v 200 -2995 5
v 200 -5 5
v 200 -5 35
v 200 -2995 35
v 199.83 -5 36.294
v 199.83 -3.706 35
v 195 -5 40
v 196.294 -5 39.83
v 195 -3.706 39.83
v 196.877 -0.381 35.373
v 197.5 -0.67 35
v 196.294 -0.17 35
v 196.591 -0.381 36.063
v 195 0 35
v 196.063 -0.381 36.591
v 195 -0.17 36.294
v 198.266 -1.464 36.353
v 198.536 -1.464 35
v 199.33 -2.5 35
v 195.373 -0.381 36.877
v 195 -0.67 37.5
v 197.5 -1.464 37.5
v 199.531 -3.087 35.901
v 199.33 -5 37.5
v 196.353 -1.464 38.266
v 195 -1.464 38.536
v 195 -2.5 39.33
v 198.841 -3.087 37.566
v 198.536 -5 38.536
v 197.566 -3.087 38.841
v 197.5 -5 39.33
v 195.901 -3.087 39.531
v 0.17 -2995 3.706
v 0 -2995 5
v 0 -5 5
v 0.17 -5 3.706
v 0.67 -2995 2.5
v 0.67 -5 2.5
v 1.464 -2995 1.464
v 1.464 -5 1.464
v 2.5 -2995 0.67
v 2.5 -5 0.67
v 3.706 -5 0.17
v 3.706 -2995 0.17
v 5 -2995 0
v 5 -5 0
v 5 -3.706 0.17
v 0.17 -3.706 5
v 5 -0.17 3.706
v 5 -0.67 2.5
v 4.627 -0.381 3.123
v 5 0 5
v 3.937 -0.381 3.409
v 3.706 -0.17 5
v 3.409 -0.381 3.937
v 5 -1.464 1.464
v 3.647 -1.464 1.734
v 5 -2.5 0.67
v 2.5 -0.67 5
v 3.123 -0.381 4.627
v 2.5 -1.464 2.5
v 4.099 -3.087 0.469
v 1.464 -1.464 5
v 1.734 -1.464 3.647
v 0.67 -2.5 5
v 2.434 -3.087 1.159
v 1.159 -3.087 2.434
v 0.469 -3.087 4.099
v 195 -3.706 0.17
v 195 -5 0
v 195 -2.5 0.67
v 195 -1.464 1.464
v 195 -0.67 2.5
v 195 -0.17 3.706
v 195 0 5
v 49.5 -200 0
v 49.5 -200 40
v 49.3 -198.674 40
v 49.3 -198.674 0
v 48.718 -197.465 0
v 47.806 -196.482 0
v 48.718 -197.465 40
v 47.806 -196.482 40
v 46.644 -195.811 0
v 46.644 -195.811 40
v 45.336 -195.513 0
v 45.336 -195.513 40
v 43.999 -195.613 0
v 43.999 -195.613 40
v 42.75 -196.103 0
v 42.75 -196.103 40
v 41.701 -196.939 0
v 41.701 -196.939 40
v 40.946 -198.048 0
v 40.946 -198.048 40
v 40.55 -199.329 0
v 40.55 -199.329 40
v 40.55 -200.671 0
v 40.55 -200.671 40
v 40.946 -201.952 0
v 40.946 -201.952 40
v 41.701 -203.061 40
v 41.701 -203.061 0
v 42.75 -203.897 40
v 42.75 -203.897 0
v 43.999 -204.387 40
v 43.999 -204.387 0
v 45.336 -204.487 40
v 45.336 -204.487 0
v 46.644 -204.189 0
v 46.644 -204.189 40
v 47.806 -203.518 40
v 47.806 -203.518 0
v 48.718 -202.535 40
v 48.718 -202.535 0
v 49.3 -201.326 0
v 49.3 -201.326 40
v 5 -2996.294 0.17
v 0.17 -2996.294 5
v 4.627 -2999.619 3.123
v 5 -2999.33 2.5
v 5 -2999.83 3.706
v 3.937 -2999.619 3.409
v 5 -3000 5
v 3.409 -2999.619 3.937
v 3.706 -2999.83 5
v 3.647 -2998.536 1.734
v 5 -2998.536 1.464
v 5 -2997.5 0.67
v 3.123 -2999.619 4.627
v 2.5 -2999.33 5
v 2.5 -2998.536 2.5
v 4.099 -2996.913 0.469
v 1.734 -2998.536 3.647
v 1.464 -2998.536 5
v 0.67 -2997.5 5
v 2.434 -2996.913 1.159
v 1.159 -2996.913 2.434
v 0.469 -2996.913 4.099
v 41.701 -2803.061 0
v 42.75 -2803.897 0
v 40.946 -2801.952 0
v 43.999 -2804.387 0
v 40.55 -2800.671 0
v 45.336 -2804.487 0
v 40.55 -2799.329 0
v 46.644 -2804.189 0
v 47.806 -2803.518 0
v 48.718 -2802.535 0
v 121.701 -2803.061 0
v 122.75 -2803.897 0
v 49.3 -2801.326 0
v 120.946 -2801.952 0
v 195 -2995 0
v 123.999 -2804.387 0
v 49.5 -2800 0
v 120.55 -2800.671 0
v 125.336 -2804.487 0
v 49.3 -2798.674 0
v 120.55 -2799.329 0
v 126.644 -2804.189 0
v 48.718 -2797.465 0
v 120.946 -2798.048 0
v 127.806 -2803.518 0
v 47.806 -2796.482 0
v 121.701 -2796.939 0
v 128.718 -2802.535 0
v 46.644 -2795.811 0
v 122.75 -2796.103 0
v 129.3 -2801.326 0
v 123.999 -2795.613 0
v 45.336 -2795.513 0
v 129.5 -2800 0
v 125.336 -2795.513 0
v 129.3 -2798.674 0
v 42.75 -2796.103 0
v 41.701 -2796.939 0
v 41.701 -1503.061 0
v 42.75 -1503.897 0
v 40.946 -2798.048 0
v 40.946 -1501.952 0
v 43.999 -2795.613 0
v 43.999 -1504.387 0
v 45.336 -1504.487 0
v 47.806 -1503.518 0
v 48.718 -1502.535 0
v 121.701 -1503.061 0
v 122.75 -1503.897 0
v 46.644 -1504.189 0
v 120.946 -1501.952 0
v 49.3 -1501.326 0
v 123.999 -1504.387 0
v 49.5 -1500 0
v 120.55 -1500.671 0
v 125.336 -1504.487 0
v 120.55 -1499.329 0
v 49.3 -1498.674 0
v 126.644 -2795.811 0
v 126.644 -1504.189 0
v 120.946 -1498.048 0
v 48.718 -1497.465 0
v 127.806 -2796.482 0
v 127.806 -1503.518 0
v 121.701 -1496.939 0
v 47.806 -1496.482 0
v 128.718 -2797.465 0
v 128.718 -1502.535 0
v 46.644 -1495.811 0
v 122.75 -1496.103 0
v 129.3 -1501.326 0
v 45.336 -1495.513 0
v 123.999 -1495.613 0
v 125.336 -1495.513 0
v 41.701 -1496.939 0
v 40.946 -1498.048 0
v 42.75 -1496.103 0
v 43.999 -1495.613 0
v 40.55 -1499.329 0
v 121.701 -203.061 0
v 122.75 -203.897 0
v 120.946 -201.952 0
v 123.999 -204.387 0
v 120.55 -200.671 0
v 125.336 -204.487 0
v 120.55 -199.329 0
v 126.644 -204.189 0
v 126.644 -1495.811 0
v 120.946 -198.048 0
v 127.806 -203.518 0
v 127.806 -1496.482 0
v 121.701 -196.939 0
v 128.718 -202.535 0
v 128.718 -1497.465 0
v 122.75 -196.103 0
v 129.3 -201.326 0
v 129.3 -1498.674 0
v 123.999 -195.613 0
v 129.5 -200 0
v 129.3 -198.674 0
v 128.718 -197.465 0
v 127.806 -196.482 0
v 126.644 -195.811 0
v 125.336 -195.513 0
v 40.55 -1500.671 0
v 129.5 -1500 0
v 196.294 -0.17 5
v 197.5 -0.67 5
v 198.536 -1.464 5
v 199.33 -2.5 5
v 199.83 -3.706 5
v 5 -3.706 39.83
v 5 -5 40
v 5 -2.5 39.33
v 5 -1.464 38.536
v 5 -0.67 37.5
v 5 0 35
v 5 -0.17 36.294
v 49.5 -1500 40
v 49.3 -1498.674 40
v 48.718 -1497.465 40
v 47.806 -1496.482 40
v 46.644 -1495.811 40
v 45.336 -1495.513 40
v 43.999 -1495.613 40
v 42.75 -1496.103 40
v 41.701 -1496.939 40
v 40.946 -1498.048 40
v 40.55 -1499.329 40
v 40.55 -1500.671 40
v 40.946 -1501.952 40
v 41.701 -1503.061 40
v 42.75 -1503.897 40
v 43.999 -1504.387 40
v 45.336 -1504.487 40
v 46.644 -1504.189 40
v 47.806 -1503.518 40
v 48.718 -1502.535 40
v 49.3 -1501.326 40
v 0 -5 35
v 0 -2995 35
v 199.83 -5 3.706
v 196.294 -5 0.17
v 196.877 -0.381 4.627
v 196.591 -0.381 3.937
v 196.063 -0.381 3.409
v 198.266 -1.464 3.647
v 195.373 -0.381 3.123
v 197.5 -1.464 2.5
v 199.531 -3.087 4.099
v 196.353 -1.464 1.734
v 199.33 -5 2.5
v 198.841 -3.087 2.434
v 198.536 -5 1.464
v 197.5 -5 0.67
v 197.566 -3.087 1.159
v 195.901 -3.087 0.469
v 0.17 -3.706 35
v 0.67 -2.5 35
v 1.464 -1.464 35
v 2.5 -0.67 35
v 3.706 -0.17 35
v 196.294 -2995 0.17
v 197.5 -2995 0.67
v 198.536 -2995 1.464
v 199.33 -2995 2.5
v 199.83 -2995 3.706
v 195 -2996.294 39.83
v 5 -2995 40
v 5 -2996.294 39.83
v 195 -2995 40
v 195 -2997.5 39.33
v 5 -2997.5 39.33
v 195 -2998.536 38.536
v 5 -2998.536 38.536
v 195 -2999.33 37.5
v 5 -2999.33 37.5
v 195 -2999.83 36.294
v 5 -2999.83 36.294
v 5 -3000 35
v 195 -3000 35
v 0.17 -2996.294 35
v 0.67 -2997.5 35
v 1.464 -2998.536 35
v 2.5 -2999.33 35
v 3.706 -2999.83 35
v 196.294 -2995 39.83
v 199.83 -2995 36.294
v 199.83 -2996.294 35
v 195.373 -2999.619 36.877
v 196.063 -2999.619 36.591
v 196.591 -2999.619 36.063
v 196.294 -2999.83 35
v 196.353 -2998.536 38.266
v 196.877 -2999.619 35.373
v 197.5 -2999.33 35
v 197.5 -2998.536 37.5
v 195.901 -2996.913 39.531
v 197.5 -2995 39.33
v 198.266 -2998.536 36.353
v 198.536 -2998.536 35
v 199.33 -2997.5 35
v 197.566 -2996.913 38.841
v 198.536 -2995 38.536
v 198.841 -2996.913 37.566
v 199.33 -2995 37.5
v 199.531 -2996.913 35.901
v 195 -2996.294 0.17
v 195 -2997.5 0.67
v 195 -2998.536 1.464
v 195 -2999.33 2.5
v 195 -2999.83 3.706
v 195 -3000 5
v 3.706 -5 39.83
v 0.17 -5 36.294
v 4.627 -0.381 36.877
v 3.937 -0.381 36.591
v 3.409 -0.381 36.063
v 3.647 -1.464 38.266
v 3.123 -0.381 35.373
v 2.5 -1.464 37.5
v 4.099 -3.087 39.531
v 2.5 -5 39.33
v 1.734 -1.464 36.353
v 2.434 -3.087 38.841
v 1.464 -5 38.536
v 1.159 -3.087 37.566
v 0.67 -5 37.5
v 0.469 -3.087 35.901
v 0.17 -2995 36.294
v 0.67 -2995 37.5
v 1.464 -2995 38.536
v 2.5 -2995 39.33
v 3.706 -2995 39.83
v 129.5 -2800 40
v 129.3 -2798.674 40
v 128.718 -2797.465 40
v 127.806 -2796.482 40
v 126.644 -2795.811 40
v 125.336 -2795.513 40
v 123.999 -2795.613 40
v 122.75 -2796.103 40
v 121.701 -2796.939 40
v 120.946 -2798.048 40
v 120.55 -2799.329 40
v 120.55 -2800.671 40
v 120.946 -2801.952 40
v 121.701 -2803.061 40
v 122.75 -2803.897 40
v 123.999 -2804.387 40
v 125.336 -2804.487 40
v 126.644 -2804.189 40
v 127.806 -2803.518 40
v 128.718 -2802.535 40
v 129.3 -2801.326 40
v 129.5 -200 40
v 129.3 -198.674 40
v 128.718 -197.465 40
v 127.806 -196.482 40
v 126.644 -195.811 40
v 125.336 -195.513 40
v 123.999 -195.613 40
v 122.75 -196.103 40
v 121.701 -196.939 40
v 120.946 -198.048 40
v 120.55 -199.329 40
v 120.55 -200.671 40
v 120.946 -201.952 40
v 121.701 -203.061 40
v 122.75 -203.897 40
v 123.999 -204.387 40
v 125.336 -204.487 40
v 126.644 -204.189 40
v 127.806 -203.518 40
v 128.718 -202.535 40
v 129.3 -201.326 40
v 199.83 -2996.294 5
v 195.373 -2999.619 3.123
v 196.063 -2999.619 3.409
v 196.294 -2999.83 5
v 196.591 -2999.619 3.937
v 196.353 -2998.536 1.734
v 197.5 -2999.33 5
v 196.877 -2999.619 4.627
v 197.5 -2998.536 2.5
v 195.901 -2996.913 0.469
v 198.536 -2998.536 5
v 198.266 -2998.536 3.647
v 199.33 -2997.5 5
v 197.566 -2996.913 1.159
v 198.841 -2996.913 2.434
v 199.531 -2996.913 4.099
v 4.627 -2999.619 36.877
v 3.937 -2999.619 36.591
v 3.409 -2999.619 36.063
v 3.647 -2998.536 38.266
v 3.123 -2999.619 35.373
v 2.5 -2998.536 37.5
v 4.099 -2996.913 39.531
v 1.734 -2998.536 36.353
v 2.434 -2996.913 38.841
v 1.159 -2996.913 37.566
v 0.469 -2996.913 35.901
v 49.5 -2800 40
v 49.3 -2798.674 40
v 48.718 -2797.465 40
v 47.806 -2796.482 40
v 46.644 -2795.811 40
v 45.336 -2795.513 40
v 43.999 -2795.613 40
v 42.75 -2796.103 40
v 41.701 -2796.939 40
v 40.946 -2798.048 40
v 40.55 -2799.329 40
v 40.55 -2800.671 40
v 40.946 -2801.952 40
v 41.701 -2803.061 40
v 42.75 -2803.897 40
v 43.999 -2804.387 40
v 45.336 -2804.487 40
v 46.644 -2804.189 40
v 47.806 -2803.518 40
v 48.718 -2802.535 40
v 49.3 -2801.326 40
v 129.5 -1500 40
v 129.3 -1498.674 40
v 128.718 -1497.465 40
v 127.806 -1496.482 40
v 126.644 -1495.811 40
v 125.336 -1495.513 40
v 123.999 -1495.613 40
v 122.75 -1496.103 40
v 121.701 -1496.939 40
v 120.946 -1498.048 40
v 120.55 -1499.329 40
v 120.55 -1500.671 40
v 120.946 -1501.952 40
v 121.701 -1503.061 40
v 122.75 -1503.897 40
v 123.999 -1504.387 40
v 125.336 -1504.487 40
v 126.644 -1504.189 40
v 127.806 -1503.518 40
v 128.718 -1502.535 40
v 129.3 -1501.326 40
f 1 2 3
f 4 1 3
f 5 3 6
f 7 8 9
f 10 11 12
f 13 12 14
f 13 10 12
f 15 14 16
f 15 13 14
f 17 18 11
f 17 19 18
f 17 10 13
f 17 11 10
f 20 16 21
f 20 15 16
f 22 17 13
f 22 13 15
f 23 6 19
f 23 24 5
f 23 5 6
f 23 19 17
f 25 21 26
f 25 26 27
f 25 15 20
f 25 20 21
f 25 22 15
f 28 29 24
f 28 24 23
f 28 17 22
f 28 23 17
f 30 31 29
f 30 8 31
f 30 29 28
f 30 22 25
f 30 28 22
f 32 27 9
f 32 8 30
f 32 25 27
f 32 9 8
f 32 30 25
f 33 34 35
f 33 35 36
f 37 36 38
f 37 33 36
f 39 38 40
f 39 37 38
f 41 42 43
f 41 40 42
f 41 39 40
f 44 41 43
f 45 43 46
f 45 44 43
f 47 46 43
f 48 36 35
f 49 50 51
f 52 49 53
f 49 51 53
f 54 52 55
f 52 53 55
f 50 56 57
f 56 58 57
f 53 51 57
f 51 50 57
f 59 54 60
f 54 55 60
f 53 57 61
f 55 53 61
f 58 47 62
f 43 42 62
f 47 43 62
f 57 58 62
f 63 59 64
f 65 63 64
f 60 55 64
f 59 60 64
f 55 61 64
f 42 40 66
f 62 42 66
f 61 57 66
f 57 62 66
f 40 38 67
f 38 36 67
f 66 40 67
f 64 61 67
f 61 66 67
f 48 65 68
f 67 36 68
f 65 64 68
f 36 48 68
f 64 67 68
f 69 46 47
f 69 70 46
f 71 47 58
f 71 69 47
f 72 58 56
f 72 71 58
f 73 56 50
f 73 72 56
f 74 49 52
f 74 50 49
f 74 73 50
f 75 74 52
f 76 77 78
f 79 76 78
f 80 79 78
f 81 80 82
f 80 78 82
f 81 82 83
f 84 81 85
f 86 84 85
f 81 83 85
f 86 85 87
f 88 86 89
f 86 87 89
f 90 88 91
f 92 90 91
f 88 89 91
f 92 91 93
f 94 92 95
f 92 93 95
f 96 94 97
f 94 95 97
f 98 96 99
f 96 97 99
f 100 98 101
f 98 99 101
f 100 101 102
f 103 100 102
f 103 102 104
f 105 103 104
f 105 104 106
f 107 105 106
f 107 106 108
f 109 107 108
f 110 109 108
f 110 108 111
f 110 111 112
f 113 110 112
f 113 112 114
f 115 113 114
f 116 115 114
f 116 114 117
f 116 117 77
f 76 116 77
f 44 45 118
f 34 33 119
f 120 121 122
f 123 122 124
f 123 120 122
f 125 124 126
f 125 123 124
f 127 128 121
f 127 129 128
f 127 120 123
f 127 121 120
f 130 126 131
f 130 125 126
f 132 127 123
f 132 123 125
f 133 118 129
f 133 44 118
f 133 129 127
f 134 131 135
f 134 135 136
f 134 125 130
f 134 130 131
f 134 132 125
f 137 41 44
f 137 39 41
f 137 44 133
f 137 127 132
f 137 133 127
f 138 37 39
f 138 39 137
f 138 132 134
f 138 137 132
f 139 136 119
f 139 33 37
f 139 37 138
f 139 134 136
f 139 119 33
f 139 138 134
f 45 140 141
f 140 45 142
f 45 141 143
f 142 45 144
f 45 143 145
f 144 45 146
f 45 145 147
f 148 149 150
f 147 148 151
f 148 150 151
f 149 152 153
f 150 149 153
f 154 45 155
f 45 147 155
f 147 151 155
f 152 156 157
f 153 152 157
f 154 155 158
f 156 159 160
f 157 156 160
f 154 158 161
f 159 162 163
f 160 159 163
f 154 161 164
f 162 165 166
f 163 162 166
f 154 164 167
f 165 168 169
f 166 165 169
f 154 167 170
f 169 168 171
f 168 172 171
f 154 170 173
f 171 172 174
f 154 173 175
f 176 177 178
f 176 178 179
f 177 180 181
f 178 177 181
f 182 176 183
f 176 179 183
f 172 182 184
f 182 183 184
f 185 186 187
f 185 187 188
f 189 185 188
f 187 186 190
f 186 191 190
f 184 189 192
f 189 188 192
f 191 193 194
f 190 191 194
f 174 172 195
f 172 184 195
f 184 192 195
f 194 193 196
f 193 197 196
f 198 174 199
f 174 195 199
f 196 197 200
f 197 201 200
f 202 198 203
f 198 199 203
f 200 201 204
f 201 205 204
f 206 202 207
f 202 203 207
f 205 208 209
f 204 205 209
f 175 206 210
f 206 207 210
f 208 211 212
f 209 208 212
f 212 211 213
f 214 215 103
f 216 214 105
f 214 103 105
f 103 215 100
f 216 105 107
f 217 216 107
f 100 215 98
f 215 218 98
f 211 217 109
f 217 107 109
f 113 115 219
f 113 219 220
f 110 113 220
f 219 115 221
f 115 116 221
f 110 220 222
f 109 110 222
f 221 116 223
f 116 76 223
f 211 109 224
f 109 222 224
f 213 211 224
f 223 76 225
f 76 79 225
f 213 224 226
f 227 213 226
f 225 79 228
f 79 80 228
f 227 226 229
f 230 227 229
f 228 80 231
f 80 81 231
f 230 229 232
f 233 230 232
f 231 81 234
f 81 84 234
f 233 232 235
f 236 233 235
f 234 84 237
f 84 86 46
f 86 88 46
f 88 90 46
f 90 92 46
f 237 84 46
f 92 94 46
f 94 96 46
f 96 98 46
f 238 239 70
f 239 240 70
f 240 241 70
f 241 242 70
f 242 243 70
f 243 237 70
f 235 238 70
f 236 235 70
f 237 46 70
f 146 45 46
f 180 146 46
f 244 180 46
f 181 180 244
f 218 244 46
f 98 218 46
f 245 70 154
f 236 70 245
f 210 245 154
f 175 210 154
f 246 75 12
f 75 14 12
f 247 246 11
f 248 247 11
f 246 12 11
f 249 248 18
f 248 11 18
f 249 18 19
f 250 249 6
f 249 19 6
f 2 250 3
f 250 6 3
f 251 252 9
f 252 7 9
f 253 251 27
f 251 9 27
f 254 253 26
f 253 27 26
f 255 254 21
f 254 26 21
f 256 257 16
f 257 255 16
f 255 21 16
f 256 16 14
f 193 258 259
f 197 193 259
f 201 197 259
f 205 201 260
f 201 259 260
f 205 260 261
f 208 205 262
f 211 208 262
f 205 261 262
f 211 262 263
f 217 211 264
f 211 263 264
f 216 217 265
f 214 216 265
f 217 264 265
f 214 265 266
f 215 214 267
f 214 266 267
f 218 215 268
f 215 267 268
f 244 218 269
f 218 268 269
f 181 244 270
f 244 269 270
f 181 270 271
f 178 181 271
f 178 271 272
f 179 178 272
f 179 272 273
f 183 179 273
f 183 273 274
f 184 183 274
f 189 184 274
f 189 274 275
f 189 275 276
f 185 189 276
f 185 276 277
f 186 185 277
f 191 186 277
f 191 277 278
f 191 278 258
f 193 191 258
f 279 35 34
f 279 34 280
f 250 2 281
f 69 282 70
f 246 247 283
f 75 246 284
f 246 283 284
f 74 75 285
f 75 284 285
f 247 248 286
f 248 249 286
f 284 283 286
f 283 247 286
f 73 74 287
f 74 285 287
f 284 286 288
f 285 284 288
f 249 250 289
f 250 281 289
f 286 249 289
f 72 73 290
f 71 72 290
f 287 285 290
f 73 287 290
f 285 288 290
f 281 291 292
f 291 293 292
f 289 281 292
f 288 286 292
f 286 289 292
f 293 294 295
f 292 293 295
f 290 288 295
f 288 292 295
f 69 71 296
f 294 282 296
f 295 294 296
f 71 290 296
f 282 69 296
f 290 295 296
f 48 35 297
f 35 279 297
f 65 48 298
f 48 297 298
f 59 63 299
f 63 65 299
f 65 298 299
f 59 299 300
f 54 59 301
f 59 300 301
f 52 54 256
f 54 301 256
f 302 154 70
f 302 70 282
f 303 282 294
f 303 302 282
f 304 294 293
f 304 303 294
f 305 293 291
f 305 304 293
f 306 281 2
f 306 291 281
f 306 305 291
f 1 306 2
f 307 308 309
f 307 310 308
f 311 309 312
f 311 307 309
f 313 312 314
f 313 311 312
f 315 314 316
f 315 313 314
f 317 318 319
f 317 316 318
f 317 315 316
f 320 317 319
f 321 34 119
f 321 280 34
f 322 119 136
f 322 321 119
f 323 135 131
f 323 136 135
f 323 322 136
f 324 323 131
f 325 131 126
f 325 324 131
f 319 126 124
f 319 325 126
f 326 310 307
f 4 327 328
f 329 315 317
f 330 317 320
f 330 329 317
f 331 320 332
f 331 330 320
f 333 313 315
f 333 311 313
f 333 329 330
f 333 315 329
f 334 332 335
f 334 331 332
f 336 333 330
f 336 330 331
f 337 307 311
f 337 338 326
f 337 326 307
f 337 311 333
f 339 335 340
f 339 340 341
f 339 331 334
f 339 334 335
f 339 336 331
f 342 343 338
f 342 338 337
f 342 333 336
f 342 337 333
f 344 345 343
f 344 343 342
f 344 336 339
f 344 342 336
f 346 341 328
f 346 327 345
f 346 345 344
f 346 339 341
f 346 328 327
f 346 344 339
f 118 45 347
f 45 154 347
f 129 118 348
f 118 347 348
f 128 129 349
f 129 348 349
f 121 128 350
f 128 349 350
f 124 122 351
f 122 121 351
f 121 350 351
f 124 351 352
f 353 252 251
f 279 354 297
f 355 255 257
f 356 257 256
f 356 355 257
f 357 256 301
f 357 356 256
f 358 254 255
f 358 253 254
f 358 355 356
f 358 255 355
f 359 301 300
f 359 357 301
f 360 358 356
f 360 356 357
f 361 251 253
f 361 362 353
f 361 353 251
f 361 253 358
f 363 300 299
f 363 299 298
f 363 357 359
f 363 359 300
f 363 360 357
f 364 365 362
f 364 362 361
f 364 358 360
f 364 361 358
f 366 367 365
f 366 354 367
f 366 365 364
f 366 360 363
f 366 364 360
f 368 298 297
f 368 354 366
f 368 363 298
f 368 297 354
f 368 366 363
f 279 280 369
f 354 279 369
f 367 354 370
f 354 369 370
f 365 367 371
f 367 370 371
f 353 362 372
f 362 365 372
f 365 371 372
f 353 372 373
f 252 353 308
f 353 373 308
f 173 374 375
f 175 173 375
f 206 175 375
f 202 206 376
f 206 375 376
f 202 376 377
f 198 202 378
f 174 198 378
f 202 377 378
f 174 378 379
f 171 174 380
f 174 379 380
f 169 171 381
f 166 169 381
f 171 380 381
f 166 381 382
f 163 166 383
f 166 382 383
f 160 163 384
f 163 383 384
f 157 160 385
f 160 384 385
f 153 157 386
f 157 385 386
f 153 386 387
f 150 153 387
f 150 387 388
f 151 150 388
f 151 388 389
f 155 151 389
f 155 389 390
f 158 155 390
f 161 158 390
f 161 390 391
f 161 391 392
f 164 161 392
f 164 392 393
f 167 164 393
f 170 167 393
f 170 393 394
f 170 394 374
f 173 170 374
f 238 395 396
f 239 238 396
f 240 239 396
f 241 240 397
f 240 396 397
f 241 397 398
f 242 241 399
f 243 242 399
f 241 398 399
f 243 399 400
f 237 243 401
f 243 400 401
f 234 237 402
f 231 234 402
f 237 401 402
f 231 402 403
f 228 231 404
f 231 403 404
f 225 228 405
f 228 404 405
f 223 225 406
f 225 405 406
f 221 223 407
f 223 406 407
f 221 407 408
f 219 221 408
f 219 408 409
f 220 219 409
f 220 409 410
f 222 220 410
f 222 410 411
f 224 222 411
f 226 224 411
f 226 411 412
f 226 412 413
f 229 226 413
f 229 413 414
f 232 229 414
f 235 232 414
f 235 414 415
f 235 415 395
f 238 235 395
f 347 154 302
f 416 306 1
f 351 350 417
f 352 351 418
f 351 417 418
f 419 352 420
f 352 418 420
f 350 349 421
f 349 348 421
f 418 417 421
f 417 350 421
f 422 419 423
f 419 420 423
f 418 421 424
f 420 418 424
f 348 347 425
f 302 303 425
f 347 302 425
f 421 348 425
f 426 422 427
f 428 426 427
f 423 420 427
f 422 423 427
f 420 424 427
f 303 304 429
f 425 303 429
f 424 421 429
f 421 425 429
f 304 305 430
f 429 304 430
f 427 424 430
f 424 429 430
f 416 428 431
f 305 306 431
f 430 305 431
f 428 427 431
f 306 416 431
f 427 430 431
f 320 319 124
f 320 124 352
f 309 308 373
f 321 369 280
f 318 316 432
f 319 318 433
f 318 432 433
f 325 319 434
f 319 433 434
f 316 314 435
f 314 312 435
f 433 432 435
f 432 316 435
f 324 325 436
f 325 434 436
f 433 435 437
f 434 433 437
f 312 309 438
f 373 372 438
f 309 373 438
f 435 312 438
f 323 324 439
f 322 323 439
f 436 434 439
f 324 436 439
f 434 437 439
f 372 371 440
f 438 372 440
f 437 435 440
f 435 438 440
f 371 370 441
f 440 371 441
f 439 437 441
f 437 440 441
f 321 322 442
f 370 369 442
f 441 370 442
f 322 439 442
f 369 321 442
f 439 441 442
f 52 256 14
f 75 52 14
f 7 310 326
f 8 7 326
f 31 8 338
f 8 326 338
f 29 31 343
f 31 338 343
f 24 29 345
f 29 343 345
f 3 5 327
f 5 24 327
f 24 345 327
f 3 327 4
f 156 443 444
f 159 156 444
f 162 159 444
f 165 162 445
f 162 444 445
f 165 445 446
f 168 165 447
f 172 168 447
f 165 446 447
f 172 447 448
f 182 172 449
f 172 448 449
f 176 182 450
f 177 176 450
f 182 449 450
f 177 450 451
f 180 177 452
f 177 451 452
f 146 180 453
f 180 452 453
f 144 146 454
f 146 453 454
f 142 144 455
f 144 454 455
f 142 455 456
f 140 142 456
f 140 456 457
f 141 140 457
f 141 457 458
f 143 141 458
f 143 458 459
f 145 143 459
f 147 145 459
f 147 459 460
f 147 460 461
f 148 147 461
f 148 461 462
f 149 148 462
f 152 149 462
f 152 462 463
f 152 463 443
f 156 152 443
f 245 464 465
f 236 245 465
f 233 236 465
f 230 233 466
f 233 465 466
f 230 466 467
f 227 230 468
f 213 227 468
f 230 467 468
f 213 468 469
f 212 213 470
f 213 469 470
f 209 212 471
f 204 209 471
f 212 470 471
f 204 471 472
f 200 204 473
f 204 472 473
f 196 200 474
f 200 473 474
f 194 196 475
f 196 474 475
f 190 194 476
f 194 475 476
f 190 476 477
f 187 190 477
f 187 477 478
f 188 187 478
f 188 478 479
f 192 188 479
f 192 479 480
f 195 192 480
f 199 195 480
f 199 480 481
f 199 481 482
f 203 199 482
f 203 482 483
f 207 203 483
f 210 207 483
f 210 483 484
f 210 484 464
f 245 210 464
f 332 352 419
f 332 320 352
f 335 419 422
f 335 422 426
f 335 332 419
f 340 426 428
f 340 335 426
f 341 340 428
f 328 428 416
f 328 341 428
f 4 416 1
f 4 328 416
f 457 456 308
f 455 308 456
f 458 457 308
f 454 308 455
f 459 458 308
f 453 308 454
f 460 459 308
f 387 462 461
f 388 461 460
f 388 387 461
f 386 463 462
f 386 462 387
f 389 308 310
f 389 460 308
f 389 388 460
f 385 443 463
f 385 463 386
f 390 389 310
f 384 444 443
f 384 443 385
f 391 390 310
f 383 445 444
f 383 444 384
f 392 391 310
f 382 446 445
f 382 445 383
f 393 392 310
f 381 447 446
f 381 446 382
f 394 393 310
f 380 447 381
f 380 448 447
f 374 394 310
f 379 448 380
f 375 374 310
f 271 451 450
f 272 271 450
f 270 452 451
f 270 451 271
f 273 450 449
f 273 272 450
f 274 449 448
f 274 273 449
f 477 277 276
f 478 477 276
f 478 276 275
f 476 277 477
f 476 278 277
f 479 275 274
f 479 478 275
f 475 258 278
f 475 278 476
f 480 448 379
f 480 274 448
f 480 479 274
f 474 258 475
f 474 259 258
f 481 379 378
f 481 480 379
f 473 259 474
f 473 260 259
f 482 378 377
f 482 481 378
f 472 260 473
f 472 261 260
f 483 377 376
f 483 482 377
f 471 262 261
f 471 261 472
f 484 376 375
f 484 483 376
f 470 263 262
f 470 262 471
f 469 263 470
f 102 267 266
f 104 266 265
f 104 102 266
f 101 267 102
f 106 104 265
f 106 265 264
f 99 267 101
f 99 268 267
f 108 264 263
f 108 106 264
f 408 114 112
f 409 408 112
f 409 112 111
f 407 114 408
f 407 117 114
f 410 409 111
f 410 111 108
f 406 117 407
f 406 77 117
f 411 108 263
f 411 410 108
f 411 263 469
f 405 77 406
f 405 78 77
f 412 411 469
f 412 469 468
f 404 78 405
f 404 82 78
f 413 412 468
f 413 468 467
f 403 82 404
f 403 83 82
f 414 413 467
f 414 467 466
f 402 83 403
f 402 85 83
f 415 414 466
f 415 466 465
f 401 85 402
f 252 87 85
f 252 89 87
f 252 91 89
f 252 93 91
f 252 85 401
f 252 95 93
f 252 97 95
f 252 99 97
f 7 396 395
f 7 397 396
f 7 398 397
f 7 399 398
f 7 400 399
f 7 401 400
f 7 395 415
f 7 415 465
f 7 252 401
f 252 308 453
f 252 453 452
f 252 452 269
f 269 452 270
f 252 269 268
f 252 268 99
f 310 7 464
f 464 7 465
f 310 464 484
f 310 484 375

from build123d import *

# Parameters (mm, degrees)
F0_W     = 200
F0_H     = 40
F1_DEPTH = 3000
F2_R     = 4.5
F3_DEPTH = 40.001
F4_R     = 5


with BuildPart() as f1:
    # F0 (on Front) → F1 (new body)
    with BuildSketch(Plane.XZ):
        with Locations((100, 20)):
            Rectangle(F0_W, F0_H)
    extrude(amount=F1_DEPTH)

    # F2 (on face) → F3 (cut, through all)
    with BuildSketch(Plane.XY.offset(40)):
        with Locations((45, -2800)):
            Circle(F2_R)
        with Locations((125, -2800)):
            Circle(F2_R)
        with Locations((45, -200)):
            Circle(F2_R)
        with Locations((125, -200)):
            Circle(F2_R)
        with Locations((45, -1500)):
            Circle(F2_R)
        with Locations((125, -1500)):
            Circle(F2_R)
    extrude(amount=-F3_DEPTH, mode=Mode.SUBTRACT)

    # F4
    f4_edges = [f1.edges().sort_by_distance(p)[0] for p in [
        (0, -1500, 40),
        (0, -1500, 0),
        (200, -1500, 40),
        (200, -1500, 0),
        (100, -3000, 40),
        (100, -3000, 0),
        (0, -3000, 20),
        (200, -3000, 20),
        (200, 0, 20),
        (100, 0, 40),
        (100, 0, 0),
        (0, 0, 20),
    ]]
    fillet(f4_edges, radius=F4_R)


solid = f1.part
